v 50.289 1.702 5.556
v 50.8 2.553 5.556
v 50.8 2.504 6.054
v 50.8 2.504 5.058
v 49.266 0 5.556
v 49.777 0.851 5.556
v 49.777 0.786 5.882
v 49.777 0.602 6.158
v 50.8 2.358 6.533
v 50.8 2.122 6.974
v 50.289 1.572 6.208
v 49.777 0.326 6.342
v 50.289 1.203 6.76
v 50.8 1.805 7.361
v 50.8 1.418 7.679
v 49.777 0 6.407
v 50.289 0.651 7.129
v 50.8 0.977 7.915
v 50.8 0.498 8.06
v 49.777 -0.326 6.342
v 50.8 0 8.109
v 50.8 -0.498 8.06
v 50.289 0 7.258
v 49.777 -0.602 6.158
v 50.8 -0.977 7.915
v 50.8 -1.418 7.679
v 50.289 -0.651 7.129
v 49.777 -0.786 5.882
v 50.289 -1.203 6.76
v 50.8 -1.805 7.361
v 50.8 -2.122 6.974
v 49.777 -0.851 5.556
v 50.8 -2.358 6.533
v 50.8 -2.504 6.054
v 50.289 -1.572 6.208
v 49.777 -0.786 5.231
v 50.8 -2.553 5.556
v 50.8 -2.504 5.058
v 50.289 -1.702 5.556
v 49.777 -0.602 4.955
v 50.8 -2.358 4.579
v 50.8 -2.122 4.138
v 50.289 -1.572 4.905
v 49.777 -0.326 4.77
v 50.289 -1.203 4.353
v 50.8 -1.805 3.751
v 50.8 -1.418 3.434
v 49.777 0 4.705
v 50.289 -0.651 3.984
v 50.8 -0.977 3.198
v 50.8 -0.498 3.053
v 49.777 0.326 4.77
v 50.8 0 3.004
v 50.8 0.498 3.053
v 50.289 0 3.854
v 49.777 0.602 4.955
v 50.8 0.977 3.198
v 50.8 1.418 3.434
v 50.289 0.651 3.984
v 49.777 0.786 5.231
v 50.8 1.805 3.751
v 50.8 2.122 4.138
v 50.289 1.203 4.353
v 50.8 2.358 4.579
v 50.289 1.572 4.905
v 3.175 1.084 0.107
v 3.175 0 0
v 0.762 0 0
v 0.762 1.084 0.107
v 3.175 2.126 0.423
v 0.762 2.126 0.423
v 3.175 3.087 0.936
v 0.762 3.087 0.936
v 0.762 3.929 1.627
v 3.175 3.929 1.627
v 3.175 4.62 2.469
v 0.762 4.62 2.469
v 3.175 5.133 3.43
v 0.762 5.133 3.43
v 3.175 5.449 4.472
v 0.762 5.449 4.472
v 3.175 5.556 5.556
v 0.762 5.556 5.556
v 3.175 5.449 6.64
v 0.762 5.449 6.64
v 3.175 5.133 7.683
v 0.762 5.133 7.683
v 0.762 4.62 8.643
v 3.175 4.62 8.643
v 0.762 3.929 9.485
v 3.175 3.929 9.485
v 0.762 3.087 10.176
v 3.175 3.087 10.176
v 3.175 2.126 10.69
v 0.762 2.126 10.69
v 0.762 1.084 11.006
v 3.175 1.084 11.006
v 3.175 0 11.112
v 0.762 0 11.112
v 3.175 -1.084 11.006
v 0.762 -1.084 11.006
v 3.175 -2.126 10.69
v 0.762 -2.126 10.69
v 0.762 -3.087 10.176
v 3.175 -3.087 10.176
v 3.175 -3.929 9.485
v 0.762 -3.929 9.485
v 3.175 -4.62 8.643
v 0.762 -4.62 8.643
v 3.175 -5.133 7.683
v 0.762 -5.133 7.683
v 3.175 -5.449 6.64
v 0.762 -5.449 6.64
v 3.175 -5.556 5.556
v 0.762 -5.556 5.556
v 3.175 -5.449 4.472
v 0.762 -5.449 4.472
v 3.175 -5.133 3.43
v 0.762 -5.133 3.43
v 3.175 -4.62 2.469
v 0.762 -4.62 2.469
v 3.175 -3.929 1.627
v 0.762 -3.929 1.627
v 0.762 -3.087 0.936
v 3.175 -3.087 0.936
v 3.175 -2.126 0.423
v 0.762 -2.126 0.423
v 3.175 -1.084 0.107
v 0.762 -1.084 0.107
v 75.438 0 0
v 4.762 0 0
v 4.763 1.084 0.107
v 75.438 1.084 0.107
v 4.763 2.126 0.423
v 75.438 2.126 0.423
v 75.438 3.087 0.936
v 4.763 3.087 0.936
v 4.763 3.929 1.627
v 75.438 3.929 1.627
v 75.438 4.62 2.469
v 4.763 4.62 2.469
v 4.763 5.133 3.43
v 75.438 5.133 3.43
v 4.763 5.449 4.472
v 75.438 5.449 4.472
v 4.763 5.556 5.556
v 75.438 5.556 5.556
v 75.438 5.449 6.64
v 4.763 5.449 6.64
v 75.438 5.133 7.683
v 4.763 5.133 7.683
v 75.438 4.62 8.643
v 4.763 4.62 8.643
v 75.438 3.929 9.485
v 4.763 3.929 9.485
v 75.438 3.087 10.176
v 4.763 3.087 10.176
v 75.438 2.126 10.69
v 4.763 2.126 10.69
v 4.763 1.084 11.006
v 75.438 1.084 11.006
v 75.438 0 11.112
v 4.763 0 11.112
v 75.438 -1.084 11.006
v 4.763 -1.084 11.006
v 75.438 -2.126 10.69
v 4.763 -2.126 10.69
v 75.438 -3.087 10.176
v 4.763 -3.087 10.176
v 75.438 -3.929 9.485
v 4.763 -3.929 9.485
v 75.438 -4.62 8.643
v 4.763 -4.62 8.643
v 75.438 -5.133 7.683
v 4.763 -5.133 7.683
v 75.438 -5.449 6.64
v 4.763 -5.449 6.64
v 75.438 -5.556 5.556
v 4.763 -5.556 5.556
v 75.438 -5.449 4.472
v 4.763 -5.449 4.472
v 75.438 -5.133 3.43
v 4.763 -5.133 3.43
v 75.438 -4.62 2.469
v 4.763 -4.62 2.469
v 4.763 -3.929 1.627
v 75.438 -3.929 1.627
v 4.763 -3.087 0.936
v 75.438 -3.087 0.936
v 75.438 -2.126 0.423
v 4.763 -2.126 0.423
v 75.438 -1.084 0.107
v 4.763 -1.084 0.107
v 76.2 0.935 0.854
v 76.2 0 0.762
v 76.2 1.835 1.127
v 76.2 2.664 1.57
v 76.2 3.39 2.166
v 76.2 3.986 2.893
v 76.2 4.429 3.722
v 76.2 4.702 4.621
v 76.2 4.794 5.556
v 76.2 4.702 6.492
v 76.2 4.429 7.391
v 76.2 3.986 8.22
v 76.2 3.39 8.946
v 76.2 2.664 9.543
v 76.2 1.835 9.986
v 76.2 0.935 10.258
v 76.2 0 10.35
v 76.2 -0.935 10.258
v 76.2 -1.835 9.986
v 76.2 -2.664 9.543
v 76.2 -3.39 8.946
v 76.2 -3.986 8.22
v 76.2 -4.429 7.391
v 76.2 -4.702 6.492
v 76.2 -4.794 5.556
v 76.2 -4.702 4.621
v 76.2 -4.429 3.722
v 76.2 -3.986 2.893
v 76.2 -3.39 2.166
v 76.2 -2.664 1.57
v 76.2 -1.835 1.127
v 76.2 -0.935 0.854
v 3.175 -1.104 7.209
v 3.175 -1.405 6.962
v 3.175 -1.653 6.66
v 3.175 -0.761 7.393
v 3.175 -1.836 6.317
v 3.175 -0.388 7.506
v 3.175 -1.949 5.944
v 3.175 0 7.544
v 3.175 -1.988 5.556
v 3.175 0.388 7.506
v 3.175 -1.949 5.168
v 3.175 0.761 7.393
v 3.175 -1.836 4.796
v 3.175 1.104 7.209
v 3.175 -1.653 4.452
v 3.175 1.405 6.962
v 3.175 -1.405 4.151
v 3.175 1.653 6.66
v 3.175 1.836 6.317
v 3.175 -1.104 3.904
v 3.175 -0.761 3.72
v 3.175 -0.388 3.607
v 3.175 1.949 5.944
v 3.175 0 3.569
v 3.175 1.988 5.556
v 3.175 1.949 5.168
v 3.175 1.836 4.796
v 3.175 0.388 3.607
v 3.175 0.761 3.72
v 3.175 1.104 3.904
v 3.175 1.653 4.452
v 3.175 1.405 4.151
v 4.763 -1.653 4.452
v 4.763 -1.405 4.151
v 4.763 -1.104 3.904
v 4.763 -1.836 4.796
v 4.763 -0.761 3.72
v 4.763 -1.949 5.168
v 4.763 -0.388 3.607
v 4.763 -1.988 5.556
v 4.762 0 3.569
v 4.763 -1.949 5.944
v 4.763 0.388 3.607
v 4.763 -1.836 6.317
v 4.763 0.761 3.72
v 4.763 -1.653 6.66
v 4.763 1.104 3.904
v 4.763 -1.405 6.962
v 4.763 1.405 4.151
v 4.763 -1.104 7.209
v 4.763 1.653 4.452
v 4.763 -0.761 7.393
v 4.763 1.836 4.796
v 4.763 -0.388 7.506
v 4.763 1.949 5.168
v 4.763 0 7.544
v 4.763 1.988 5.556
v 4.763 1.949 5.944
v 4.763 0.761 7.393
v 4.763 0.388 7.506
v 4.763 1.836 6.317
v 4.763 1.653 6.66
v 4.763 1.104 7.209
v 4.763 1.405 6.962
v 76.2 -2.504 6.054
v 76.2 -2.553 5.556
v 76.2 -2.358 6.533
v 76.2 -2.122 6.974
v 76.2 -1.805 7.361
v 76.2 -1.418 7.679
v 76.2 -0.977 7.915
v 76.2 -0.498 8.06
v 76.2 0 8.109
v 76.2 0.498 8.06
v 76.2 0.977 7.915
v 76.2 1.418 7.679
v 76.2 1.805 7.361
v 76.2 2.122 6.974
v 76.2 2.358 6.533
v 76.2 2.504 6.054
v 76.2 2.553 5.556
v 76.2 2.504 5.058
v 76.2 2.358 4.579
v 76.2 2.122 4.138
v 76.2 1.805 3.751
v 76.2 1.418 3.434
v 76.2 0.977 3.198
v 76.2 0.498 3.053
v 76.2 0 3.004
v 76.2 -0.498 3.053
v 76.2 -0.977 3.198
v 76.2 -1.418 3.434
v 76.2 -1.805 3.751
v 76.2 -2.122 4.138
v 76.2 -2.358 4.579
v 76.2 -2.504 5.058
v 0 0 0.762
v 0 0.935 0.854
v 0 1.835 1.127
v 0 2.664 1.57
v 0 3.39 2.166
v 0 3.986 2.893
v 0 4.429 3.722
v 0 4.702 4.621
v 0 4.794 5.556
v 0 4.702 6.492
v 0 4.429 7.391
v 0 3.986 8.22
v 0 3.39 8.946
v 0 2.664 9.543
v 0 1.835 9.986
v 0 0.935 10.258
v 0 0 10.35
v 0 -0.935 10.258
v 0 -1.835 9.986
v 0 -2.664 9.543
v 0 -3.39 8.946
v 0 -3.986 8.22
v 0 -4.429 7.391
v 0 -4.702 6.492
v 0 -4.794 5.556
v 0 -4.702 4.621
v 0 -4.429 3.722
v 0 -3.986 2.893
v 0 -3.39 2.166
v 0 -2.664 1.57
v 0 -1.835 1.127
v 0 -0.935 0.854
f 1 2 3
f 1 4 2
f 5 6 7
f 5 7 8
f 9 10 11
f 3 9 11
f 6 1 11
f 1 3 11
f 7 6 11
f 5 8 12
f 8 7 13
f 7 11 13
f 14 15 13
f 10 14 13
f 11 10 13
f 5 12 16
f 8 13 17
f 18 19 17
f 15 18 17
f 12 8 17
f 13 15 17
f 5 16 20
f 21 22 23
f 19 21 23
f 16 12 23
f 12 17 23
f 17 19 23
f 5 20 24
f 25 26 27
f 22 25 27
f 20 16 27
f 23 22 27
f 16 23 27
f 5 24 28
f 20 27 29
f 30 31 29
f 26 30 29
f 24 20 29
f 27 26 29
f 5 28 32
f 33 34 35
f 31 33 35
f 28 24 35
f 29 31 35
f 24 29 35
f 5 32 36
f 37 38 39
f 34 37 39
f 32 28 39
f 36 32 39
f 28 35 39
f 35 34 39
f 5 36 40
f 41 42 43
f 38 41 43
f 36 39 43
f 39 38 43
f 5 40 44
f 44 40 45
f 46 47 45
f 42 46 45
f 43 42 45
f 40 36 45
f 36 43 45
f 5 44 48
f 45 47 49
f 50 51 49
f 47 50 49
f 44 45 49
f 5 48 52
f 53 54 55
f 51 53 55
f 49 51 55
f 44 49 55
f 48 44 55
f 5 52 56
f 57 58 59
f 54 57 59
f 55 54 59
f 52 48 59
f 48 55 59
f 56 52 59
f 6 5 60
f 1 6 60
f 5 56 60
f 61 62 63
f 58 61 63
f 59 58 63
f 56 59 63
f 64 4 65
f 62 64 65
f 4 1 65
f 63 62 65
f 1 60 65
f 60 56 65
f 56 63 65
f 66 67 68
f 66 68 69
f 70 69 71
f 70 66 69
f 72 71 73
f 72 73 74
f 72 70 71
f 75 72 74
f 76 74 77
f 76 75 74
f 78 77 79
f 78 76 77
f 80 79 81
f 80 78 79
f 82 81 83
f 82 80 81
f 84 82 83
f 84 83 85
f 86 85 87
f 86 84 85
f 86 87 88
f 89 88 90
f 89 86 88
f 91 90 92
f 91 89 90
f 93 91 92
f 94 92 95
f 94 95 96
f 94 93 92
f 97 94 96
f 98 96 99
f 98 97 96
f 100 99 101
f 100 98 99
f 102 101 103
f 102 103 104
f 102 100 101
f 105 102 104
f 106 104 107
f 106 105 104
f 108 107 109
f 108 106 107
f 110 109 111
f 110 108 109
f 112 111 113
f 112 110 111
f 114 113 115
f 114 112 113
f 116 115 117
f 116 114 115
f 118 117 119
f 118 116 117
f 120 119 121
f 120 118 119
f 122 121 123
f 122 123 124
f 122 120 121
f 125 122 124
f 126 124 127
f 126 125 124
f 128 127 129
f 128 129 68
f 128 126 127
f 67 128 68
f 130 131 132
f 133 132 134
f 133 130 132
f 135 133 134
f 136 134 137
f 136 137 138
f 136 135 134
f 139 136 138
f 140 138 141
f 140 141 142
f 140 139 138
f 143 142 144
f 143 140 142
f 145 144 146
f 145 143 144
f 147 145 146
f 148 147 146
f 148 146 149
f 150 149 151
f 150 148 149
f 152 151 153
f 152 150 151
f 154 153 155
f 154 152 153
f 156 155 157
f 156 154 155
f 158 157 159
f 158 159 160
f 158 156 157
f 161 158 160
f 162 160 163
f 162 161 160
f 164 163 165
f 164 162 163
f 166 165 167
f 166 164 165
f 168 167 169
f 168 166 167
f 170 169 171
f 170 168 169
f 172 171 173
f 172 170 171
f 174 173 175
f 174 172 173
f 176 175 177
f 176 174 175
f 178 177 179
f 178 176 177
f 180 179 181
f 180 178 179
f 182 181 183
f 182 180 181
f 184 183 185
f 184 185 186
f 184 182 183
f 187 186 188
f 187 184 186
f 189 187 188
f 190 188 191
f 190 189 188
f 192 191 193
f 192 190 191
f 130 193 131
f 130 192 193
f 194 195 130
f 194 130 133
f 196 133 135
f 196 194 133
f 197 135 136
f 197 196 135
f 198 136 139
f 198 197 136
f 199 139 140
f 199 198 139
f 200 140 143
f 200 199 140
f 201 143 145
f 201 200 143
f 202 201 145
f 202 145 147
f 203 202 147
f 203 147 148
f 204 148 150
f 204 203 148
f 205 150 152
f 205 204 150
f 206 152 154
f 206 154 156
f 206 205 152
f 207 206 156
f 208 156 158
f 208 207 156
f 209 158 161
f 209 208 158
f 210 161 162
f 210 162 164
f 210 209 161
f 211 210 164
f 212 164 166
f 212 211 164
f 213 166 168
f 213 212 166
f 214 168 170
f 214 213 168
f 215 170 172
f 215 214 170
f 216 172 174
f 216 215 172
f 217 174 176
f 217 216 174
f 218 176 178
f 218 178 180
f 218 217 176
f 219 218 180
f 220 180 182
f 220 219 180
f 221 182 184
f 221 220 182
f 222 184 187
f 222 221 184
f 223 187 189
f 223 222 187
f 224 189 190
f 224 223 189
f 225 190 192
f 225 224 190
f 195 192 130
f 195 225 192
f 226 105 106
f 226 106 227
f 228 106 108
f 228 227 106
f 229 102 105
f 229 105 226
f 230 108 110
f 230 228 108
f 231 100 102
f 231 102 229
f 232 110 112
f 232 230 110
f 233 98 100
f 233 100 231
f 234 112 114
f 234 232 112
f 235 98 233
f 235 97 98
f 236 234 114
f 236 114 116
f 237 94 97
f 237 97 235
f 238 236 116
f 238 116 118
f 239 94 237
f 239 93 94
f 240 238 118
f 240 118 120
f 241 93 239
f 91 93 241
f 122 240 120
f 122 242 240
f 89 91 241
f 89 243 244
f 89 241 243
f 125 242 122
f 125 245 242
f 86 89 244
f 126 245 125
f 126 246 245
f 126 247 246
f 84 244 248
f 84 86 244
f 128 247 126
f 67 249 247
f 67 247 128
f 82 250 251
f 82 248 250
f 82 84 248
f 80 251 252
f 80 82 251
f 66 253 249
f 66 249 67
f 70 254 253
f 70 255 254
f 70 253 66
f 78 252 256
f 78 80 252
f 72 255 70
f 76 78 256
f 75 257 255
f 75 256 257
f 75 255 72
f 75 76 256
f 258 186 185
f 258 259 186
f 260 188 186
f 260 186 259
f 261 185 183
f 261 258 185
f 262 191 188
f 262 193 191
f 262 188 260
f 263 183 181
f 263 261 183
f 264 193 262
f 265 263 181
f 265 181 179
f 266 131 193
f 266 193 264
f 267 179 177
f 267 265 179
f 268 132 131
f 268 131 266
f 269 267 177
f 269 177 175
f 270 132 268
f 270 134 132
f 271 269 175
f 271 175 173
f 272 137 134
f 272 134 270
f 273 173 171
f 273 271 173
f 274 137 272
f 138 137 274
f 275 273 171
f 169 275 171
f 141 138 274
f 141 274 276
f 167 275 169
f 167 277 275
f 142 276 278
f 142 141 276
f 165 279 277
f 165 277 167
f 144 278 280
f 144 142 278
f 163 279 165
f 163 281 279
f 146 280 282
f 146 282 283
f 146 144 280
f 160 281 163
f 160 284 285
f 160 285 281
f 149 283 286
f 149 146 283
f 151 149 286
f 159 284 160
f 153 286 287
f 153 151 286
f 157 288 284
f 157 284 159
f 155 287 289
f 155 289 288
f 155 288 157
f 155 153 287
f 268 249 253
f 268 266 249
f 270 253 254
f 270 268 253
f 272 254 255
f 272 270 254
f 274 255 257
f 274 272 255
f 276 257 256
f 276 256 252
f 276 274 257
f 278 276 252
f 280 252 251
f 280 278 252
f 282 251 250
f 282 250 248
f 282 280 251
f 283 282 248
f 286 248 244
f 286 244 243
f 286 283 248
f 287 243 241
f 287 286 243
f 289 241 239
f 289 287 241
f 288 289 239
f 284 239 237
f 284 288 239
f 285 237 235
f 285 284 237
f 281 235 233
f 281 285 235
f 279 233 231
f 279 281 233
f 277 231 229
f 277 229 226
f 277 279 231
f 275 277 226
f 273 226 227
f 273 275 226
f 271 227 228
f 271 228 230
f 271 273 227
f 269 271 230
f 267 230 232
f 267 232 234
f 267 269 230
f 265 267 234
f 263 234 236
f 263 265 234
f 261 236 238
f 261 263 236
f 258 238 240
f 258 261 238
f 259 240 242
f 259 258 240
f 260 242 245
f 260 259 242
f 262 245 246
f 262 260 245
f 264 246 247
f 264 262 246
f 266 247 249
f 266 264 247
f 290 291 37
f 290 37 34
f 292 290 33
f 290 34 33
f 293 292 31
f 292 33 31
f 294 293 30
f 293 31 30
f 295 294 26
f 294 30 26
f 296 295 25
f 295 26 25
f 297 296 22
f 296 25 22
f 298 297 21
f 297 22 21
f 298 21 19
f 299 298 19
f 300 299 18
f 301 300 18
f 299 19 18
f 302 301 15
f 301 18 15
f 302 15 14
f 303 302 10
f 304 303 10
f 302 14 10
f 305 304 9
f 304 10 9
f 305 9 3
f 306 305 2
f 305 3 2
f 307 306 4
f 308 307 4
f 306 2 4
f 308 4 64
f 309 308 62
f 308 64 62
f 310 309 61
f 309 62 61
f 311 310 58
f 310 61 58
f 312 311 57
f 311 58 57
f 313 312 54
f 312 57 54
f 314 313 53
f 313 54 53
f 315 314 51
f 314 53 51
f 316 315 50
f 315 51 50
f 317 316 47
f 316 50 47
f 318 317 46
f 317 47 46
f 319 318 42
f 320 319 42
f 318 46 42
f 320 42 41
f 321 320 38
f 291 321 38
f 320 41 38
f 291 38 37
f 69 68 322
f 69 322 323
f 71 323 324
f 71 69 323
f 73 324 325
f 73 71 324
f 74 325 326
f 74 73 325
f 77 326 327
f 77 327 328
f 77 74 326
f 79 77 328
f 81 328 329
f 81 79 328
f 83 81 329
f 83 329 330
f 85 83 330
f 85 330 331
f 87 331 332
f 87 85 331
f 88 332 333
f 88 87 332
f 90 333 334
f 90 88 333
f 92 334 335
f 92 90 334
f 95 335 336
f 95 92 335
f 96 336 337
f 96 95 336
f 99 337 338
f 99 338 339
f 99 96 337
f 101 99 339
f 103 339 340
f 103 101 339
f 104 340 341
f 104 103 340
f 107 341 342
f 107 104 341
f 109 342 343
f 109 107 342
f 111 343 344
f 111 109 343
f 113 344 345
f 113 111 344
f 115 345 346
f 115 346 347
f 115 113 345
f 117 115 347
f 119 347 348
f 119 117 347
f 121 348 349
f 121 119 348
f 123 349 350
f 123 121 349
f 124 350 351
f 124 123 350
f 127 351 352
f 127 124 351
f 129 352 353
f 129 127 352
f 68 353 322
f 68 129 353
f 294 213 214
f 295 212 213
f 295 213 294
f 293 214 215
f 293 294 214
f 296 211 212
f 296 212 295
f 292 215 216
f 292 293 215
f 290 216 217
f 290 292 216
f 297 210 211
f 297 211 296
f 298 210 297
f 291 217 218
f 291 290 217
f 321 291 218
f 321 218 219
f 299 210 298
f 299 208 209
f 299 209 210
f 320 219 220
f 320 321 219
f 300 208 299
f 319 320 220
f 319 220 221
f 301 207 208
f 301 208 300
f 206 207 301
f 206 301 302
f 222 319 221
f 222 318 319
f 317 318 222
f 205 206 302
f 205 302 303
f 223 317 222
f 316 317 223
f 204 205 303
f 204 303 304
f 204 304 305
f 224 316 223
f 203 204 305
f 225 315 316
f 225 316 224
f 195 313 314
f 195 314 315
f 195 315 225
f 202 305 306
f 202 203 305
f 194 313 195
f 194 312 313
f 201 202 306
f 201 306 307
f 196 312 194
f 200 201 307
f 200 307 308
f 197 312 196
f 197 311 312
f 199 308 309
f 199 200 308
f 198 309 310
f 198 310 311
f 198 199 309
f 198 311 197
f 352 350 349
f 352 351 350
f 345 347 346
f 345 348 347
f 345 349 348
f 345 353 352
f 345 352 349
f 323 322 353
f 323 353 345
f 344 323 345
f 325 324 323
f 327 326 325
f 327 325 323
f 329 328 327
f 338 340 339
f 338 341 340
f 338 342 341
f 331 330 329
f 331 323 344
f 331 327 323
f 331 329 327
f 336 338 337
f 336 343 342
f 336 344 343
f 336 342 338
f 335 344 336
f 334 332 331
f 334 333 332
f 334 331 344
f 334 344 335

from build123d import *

# Parameters (mm, degrees)
F2_SIZE  = 0.762
F4_D     = 5.1054
F4_DEPTH = 25.4
F4_TIP   = 1.5338169022


with BuildPart() as f1:
    # F0 (on Front) → F1 (revolve)
    with BuildSketch(Plane.XZ):
        Polygon((4.7625, 0), (76.2, 0), (76.2, 5.55625), (0, 5.55625), (0, 0), (3.175, 0), (3.175, 3.5687), (4.7625, 3.5687), align=None)
    revolve(axis=Axis((38.1, 0, 5.55625), (1, 0, 0)))

    # F2
    f2_edges = [f1.edges().sort_by_distance(p)[0] for p in [
        (0, 0, 11.1125),
        (76.2, 0, 11.1125),
    ]]
    chamfer(f2_edges, length=F2_SIZE)

    # F4
    with Locations(Plane.YZ.offset(76.2)):
        with Locations((0, 5.55625)):
            Hole(F4_D / 2, depth=F4_DEPTH)
            with Locations((0, 0, -(F4_DEPTH + F4_TIP / 2))):  # 118° drill point
                Cone(0, F4_D / 2, F4_TIP, mode=Mode.SUBTRACT)


solid = f1.part
